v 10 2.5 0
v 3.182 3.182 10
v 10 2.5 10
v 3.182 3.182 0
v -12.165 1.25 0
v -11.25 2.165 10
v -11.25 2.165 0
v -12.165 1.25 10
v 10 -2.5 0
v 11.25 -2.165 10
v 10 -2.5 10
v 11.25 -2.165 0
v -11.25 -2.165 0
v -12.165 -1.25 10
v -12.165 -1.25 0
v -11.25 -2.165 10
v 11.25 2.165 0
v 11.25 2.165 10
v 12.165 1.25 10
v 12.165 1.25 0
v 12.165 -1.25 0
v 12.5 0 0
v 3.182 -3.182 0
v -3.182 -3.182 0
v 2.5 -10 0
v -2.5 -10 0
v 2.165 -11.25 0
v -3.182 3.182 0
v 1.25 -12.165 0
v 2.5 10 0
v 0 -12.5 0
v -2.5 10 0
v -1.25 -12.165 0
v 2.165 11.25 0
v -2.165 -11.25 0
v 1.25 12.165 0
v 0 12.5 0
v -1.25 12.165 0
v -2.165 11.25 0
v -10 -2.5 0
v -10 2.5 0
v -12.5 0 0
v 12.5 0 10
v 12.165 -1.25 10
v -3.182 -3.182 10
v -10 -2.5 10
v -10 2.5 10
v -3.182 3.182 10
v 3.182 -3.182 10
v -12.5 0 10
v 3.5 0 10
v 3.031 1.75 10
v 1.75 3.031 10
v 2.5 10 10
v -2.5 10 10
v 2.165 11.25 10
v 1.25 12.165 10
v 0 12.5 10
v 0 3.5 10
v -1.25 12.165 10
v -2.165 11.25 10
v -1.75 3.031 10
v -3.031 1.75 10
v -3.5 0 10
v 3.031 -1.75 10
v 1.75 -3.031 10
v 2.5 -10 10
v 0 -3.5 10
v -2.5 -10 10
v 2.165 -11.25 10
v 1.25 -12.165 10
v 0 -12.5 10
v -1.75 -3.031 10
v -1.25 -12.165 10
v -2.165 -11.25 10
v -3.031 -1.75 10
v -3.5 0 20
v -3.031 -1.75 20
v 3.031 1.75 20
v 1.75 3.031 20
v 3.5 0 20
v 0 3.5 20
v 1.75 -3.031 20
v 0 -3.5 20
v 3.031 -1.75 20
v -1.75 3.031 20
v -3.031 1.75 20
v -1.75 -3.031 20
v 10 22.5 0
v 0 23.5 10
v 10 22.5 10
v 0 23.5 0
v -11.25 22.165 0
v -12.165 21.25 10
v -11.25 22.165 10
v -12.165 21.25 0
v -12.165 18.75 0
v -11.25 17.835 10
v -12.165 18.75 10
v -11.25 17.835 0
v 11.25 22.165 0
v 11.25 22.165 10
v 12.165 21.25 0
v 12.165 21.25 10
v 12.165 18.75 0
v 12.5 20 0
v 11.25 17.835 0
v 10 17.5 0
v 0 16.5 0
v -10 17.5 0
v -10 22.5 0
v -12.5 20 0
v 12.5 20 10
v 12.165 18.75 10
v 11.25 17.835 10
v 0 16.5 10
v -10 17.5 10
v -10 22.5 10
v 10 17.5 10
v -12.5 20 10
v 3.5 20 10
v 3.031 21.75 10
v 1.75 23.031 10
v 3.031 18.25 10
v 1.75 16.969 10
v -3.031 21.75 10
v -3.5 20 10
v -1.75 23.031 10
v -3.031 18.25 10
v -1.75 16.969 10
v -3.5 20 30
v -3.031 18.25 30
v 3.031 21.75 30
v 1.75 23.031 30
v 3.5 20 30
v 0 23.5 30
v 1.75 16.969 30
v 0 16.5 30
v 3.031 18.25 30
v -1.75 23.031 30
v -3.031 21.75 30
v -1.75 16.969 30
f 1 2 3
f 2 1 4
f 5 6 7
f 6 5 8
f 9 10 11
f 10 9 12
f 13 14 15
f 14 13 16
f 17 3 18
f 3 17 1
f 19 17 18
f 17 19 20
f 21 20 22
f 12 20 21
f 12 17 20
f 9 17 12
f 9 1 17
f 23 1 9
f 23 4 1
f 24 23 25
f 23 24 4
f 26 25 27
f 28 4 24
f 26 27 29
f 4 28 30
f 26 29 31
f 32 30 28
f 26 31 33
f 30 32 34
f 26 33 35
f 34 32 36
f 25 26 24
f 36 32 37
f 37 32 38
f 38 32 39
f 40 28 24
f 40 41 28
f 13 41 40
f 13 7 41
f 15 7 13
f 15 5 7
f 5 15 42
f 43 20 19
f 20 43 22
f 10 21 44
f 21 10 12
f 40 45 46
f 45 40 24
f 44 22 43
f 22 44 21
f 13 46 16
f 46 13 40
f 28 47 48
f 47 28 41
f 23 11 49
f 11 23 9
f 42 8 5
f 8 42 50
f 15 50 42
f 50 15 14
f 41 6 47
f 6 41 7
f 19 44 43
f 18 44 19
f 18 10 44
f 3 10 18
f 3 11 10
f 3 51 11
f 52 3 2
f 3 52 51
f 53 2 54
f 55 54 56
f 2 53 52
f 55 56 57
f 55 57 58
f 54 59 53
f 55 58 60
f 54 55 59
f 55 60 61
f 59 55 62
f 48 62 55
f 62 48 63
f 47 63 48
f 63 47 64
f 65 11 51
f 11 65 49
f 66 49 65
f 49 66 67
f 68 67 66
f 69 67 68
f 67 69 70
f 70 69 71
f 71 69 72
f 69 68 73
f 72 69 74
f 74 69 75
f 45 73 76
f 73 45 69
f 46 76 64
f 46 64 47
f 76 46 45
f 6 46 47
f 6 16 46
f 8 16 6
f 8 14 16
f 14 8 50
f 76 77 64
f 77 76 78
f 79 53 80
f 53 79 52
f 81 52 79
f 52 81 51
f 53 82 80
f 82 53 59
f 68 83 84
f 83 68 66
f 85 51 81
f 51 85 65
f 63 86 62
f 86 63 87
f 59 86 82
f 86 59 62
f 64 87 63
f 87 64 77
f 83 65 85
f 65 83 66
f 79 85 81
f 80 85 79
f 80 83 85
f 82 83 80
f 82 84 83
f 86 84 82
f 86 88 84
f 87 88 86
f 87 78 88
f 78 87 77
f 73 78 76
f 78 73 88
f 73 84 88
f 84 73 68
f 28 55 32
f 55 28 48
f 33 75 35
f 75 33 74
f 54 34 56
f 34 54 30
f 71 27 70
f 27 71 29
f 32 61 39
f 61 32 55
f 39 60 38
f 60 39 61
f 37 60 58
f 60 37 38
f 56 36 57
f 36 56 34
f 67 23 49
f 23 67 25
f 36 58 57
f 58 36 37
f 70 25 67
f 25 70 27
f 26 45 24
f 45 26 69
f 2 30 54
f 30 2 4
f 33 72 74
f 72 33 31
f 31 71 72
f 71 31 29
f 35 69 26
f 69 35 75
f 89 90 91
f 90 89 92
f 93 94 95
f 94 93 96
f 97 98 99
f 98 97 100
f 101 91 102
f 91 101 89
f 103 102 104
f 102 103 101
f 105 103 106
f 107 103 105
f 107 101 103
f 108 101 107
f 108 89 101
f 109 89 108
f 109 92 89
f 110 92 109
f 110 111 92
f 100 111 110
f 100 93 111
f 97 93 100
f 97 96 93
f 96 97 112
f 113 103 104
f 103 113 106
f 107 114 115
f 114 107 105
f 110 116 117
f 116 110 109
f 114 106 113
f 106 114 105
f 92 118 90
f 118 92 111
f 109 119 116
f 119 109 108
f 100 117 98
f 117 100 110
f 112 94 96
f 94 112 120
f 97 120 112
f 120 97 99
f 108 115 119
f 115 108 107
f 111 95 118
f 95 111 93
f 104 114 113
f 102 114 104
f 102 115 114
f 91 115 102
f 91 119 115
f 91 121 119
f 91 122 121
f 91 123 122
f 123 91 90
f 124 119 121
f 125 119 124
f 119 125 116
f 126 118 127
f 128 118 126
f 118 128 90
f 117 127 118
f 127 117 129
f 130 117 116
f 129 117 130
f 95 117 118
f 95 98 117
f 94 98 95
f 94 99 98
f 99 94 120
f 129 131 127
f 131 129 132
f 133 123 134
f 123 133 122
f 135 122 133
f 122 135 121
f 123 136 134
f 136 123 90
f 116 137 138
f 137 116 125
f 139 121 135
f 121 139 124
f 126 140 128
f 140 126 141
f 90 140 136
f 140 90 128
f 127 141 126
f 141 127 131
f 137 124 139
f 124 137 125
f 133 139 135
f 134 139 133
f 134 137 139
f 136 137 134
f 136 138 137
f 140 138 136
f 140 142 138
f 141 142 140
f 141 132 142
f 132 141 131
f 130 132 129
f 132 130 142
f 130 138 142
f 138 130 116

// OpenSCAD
// file: Screw.scad
/* Screw Library */
/* (c)copyright 2018 by Gerald Wodni <gerald.wodni@gmail.com> */

/** M3 **/
M3shaft = 4;
M3head = 6.5;
M3transition = 0.5;
M3Nut = 7;
M3NutHeight = 2.5;
M3NutCage = 15;

NutDiameter = 7;

E = 0.1;
E2 = E/2;

module m3NutHole(x, y, h) {
    translate([x, y]) {
        translate([0, 0, -h-E2])
        cylinder(d=M3shaft, h=h+E, $fn=32);
        
        translate([0, 0, -NutDepth])
        cylinder(d=NutDiameter, h=h+E, $fn=6);
    }
}

module m3Padding(x, y, h, padding) {
    translate([x,y])
    cylinder( d=M3shaft + padding*2, h = h );
}

module m3(x = 0,y = 0, depth = 10, head = 0, nut = 0) {
    translate([x,y]) {
        /* shaft */
        translate([0,0,-E])
        cylinder(d=M3shaft, h=depth+E);
        
        /* transition */
        translate([0, 0, depth-head-E-M3transition])
        cylinder(d1=M3shaft, d2=M3head, M3transition+E*2);
        
        /* head */
        translate([0, 0, depth-head])
            cylinder(d=M3head, h=head+E);
        
        if( nut > 0 )
            translate([0,0,-E2])
            cylinder( d=M3Nut, h = E+nut, $fn=6 );
    }
}
// main file
/* Pan/Tilt Servo Platform for the Bitkanone V2 */
/* (c)copyright 2018 by Gerald Wodni <gerald.wodni@gmail.com> */

PlateWidth = 96;
PlateScrewOffset = 14;

PlateThickness = 2;
NutDepth = 0.5;

ScrewPadding = 2;
//$fn = 64;
$fn = 12;

include <Screw.scad>;

module m3Hole( x, y ) {
    translate([x,y,-PlateWidth/2])
    cylinder( d=M3shaft, h = PlateWidth );
}

module m3Plate( x, y ) {
    translate([x,y,0])
    cylinder( d=M3shaft + PlatePadding*2, h = PlateThickness );
}

module bitPlate() {
    //%cube([PlateWidth, PlateWidth, 0.1]);
    
    screwXYs = [
        // Top Left
        [PlateScrewOffset, PlateWidth-PlateScrewOffset],
        // Top Right
        [PlateWidth-PlateScrewOffset, PlateWidth-PlateScrewOffset],
        // Bottom
        [PlateWidth-PlateScrewOffset*2, PlateScrewOffset]
    ];
    
    // hulled, padded screws
    difference() {
        hull()
        for( i = [0:len(screwXYs)-1] )
            m3Padding(screwXYs[i][0], screwXYs[i][1], PlateThickness, ScrewPadding);
        
        for( i = [0:len(screwXYs)-1] )
            #m3(screwXYs[i][0], screwXYs[i][1], nut=NutDepth);
    }
}


//bitPlate();

module servoArmP( outerDiameter, centerDiameter, spacing, centerHeight, h ) {
    hull() {
        translate( [ spacing, 0, 0 ] )
        cylinder( d = outerDiameter, h = h );
        
        cylinder( d = centerDiameter, h = h );
        
        translate( [-spacing, 0, 0 ] )
        cylinder( d = outerDiameter, h = h );
    }
    cylinder( d = centerDiameter, h = centerHeight );
}

module servoArm() {
    OuterDiameter = 5;
    CenterDiameter = 7;
    CrossDistance = 10;
    CrossHeight = 10;
    CenterHeight = 30;
 
    servoArmP( OuterDiameter, CenterDiameter, CrossDistance, CenterHeight, CrossHeight );
}

module servoCross() {
    OuterDiameter = 5;
    CenterDiameter = 7;
    CrossDistance = 10;
    CrossHeight = 10;
    CenterHeight = 20;
 
    servoArmP( OuterDiameter, CenterDiameter, CrossDistance, CenterHeight, CrossHeight );
    rotate([0, 0, 90])
    servoArmP( OuterDiameter, CenterDiameter, CrossDistance, CenterHeight, CrossHeight );
}

servoCross();
translate([0, 20, 0])
servoArm();
